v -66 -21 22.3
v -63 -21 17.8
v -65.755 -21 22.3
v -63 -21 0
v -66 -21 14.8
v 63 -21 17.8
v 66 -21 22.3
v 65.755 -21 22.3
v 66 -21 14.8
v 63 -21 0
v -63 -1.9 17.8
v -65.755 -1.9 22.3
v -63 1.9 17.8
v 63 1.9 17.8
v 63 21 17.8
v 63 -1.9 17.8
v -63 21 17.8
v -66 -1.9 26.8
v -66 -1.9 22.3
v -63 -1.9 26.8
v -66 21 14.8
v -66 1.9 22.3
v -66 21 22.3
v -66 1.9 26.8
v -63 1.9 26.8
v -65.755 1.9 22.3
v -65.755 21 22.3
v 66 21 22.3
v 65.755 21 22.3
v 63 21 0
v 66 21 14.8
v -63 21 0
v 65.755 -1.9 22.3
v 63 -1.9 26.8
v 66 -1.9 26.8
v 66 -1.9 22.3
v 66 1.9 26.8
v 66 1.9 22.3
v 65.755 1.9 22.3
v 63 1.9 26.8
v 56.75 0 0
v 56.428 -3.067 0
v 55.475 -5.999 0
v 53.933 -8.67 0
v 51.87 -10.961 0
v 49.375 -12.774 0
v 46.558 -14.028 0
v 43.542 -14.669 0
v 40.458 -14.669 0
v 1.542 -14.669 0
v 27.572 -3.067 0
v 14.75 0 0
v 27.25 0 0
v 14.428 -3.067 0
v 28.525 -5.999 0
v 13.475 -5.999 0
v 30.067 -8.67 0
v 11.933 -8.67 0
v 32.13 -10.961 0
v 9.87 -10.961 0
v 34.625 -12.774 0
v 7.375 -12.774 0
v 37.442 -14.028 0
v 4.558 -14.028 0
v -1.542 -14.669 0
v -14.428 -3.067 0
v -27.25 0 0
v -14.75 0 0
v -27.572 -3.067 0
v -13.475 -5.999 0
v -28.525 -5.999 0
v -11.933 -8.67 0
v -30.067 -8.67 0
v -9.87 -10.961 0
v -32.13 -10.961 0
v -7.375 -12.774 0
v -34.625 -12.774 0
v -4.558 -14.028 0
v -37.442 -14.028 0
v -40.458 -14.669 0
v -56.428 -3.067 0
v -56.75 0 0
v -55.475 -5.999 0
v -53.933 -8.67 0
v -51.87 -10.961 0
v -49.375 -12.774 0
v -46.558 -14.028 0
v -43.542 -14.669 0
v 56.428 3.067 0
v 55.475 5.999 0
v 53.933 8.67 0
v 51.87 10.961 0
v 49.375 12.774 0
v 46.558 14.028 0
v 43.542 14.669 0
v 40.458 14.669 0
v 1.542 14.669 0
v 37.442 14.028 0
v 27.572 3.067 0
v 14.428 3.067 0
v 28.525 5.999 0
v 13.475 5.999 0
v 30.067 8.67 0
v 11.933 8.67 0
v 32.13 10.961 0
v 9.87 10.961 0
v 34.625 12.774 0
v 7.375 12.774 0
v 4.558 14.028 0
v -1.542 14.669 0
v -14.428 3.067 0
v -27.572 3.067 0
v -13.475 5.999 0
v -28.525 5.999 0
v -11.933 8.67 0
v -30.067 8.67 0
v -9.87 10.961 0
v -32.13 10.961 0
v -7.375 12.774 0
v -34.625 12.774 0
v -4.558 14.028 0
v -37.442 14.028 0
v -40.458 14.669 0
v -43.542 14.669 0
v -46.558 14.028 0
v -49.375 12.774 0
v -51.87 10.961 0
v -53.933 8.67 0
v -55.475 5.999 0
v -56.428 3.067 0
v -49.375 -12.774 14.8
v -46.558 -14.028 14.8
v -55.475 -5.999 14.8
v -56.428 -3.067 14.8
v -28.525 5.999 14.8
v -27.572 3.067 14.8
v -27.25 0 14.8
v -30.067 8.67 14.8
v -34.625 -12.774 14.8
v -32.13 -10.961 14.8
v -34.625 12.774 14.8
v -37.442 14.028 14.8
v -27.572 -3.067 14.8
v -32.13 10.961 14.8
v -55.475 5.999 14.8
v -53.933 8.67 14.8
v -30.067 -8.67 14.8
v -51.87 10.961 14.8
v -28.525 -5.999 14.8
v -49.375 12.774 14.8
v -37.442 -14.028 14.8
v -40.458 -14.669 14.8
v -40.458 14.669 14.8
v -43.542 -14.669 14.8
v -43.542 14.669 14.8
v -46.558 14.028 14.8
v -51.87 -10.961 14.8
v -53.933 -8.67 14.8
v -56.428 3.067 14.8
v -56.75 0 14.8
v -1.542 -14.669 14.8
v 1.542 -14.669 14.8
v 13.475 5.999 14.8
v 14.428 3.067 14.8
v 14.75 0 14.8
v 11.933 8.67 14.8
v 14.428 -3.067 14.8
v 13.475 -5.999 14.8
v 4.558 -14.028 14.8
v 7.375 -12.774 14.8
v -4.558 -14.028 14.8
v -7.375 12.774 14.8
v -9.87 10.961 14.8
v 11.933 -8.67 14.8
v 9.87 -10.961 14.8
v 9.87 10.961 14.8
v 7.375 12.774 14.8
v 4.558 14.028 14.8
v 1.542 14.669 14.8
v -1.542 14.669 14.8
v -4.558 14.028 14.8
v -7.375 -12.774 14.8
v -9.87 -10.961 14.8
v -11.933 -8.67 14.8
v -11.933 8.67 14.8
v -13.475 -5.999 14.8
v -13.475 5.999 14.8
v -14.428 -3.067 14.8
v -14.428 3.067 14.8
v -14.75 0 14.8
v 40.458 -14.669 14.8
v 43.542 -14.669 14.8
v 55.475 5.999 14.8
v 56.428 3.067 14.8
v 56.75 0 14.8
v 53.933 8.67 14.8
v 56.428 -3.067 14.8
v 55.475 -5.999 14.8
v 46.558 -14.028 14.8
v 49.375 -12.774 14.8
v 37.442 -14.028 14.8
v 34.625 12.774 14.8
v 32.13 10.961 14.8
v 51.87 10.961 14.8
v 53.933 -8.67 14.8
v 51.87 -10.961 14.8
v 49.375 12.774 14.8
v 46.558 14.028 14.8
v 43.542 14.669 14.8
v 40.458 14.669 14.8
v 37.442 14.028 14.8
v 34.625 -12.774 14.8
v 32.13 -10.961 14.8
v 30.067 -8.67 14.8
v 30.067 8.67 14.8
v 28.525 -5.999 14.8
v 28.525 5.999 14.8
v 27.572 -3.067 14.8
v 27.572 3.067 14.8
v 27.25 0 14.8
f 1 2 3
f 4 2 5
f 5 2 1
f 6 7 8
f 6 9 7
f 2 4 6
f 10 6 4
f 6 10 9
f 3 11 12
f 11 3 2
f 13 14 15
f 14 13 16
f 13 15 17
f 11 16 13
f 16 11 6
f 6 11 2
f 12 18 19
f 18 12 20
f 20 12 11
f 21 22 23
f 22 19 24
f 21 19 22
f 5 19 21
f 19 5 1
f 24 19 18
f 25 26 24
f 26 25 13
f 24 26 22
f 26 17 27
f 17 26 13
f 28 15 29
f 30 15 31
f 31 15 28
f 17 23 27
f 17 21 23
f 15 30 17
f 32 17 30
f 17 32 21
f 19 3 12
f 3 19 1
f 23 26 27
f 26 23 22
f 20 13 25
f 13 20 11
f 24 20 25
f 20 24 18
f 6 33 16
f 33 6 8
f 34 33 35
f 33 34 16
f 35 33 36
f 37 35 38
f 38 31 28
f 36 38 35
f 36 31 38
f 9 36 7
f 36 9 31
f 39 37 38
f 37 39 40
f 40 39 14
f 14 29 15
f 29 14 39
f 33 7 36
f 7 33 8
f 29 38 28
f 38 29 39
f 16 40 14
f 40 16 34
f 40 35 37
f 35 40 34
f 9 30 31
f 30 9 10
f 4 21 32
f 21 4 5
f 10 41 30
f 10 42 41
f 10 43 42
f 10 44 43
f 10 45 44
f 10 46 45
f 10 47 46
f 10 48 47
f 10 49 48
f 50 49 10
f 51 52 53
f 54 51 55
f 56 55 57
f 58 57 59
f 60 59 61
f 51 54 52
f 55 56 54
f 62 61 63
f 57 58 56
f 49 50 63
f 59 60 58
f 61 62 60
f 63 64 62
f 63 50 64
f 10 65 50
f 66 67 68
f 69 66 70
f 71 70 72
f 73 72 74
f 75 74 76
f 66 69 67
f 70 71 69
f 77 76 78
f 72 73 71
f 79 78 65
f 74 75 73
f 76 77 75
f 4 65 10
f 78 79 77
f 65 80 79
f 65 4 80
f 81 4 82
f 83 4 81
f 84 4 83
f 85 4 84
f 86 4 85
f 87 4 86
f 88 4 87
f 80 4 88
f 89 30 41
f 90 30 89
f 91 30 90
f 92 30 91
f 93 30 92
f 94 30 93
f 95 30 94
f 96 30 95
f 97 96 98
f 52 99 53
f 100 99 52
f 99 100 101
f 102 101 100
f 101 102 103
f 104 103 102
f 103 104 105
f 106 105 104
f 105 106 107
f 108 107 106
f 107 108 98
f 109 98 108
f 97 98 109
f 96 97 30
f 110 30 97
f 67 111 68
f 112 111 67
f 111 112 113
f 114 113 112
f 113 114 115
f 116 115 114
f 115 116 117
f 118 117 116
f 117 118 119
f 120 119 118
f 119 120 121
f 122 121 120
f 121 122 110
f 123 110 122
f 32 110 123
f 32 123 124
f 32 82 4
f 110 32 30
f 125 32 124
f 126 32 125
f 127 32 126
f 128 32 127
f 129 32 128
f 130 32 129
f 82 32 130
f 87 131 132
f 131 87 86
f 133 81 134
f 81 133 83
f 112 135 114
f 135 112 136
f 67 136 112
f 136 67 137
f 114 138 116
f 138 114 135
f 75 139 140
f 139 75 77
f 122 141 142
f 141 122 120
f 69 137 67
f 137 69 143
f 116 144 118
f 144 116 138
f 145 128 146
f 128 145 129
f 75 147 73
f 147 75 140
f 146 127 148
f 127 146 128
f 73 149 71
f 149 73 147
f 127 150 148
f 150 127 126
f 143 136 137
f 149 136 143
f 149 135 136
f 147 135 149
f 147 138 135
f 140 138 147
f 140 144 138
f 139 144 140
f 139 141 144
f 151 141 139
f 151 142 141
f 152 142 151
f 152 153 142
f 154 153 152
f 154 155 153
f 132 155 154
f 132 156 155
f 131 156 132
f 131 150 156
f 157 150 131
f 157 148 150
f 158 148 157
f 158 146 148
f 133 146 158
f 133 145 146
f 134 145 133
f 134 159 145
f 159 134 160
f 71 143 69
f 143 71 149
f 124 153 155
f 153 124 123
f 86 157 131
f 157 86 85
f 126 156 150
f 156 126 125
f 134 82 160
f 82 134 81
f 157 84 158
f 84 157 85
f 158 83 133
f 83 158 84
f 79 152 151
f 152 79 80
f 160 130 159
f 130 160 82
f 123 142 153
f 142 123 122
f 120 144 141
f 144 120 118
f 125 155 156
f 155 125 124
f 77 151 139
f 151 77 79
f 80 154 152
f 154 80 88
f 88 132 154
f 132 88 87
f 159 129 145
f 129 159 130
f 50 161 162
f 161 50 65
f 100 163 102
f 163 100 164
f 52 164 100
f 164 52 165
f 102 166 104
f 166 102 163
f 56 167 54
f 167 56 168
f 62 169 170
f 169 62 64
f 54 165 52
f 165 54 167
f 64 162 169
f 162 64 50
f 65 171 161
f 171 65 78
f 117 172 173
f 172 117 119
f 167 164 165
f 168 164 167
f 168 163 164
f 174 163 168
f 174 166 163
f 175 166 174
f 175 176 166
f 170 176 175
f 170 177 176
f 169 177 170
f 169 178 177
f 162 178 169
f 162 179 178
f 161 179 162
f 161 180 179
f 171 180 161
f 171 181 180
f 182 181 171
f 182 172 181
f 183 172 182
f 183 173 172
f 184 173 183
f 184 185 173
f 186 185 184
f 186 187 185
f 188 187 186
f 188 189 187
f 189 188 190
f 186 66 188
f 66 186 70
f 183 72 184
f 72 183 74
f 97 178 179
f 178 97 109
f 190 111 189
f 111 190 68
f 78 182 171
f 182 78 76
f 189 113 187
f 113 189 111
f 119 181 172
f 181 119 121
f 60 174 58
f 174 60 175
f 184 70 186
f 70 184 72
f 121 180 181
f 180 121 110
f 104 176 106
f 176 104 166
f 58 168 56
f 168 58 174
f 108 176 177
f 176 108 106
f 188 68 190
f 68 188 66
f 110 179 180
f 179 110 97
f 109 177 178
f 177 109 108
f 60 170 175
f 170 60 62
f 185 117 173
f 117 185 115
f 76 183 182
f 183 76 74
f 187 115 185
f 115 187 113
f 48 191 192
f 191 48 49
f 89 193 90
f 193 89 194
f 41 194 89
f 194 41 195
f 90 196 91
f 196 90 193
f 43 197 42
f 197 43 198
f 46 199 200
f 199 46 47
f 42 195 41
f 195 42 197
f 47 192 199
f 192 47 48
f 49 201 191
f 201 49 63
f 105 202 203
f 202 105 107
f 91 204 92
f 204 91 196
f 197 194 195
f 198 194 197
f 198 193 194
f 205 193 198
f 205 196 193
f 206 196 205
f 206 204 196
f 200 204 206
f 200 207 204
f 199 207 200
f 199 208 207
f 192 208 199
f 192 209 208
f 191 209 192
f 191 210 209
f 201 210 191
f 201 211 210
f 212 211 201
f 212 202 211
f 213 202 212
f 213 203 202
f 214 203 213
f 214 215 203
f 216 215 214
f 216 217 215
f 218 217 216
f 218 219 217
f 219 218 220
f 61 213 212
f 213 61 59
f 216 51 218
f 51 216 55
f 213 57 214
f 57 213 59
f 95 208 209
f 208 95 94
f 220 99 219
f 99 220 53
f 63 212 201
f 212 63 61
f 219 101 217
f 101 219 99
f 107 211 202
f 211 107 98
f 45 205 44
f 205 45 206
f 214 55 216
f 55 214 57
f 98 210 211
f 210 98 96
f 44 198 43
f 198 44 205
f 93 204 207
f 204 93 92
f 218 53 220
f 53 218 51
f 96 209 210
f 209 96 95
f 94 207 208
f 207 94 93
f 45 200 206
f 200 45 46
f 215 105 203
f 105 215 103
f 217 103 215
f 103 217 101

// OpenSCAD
// file: constants.scad
// Copyright Ian G. Clifton 2026
// Apache 2.0 license
// https://github.com/IanGClifton/modular-paint-stack

GRIDFINITY_DIMENSION = 42;
CIRCLE_RESOLUTION = 100;

SHELF_SUPPORT_WIDTH = 3;
SHELF_SUPPORT_BLOCK_PROTRUSION = 9;
SHELF_SUPPORT_BLOCK_X = 3;
SHELF_SUPPORT_BLOCK_Y = 3.8;
SHELF_SUPPORT_ANGLE_X = 2.9;
SHELF_SUPPORT_ANGLE_Y = (GRIDFINITY_DIMENSION - SHELF_SUPPORT_BLOCK_Y) / 2;
SHELF_SUPPORT_ANGLE_PROTRUSION = 4.9;
SHELF_SUPPORT_SPACING = 2;
SHELF_SUPPORT_ANGLE_CUT = 0.4;

SHELF_THICKNESS = 3;
SHELF_MIN_BACK_RAIL = 8;

SIDE_X = 8;
SIDE_Y = GRIDFINITY_DIMENSION;

DOVETAIL_XMIN = 3.0;
DOVETAIL_XMAX = 4.0;
DOVETAIL_YDEPTH = 3.0;
DOVETAIL_ZDIFF = 5.0;
DOVETAIL_ZMAX = 30.0;
DOVETAIL_ZMIN = DOVETAIL_ZMAX - DOVETAIL_ZDIFF;
DOVETAIL_OFFSET = (SIDE_X / 2) - (DOVETAIL_XMAX / 2);

SHELF_BRACKET_WIDTH = 2;
SHELF_BRACKET_OPENING_HEIGHT = 5;
SHELF_BRACKET_OPENING_WIDTH = 3;
SHELF_BRACKET_CONNECTION_HEIGHT = 4;
SHELF_BRACKET_Y_DEPTH = 19;
SHELF_BRACKET_Y_GAP = 4;

CUTOUT_SHAPE_NONE = 0;
CUTOUT_SHAPE_OVAL = 1;
CUTOUT_SHAPE_RECTANGLE = 2;
CUTOUT_SHAPE_ANGLED_RECTANGLE = 3;

function getShelfMainWidth(gridfinityUnits) = GRIDFINITY_DIMENSION * gridfinityUnits;

function getShelfFullWidth(gridfinityUnits) = (SHELF_SUPPORT_WIDTH * 2) + getShelfMainWidth(gridfinityUnits);
// file: shelf_base.scad
// Copyright Ian G. Clifton 2026
// Apache 2.0 license
// https://github.com/IanGClifton/modular-paint-stack

include <constants.scad>

/**
  * Creates an empty shelf
  *
  * The shelf has the support pieces to fit into the walls,
  * but the top of the shelf is flat with no cutouts for
  * paints, brushes, etc.
  */
module uniformShelf(gridfinityWidth, gridfinityDepth = 1) {
    for (i = [0 : gridfinityDepth - 1]) {
        translate([0, GRIDFINITY_DIMENSION * i, 0]) {
            union() {
                // Shelf main
                cube([getShelfFullWidth(gridfinityWidth), GRIDFINITY_DIMENSION, SHELF_THICKNESS]);
                
                // Support on each end
                shelfSupport();
                translate([getShelfFullWidth(gridfinityWidth), 0, 0])
                    mirror([1, 0, 0])
                        shelfSupport();
            }
        }
    }
}

/**
  * Modifies the uniformShelf() to be thicker or thinner
  *
  * This adjusts only the center of the shelf where paints
  * would go, allowing the thickness of this part of the shelf
  * to match the paint neck height.
  */
module thicknessAdjustedShelf(gridfinityWidth, targetThickness, gridfinityDepth = 1) {
    if (targetThickness == SHELF_THICKNESS) {
        uniformShelf(gridfinityWidth, gridfinityDepth);
    } else if (targetThickness > SHELF_THICKNESS) {
        // Thicken the shelf
        union() {
            uniformShelf(gridfinityWidth, gridfinityDepth);
            translate([SHELF_SUPPORT_WIDTH + SHELF_SUPPORT_SPACING, 0, SHELF_THICKNESS])
                cube([getShelfMainWidth(gridfinityWidth) - (SHELF_SUPPORT_SPACING * 2), GRIDFINITY_DIMENSION * gridfinityDepth, targetThickness - SHELF_THICKNESS]);
        }
    } else {
        // Thin the shelf
        difference() {
            uniformShelf(gridfinityWidth, gridfinityDepth);
            translate([SHELF_SUPPORT_WIDTH + SHELF_SUPPORT_SPACING, 0, targetThickness])
                cube([getShelfMainWidth(gridfinityWidth) - (SHELF_SUPPORT_SPACING * 2), GRIDFINITY_DIMENSION * gridfinityDepth, SHELF_THICKNESS - targetThickness]);
        }
    }
}

/**
  * Creates the two triangles and center block used to connect
  * the shelf to the shelf brackets on the sides
  */
module shelfSupport() {
    topPoint = SHELF_THICKNESS + SHELF_SUPPORT_ANGLE_PROTRUSION;
    triangle_points = [
        // Front
        [0, 0, topPoint],                             // 0 TL
        [SHELF_SUPPORT_BLOCK_X, 0, SHELF_THICKNESS],  // 1 BR
        [0, 0, SHELF_THICKNESS],                      // 2 BL
        // Back
        [0, SHELF_SUPPORT_ANGLE_Y, topPoint],                            // 3 TL
        [SHELF_SUPPORT_BLOCK_X, SHELF_SUPPORT_ANGLE_Y, SHELF_THICKNESS], // 4 BR
        [0, SHELF_SUPPORT_ANGLE_Y, SHELF_THICKNESS]                      // 5 BL
    ];
    triangle_faces = [
        [0, 1, 2],    // Front face
        [3, 5, 4],    // Back face
        [3, 0, 2, 5], // Left side
        [3, 4, 1, 0], // Top
        [2, 1, 4, 5]  // Bottom  
    ];
    triangle_offset = SHELF_SUPPORT_ANGLE_Y + SHELF_SUPPORT_BLOCK_Y;
    union() {
        difference() {
            // Two triangles
            for (i = [0 : 1]) {
                translate([0, i * triangle_offset, 0])
                polyhedron(points = triangle_points, faces = triangle_faces);
            }
            // Cube to "cut" the tip of the triangles
            translate([0, 0, topPoint - SHELF_SUPPORT_ANGLE_CUT])
                cube([SHELF_SUPPORT_BLOCK_X, (SHELF_SUPPORT_ANGLE_Y * 2) + SHELF_SUPPORT_BLOCK_Y, SHELF_SUPPORT_ANGLE_CUT]);
        }
        // Add the block protrusion
        translate([0, SHELF_SUPPORT_ANGLE_Y, SHELF_THICKNESS])
            cube([SHELF_SUPPORT_BLOCK_X, SHELF_SUPPORT_BLOCK_Y, SHELF_SUPPORT_BLOCK_PROTRUSION]);
    }
}
// main file
// Copyright Ian G. Clifton 2026
// Apache 2.0 license
// https://github.com/IanGClifton/modular-paint-stack

// Gridfinity units (42mm each) to make the width of the inner shelf part  
shelf_gridfinity_unit_width = 3;
// How many mm to inset the cylinder cutout
cylinder_height = 14.8;
// Diameter of cylinder cutout
cylinder_diameter = 29.5;
// How many cutouts to include
cylinder_count = 3;
// Whether the top should be inset (slanted in) or flat (perfectly vertical)
top_inset = true;

include <shelf_base.scad>

/**
  * Creates a solid trapezoid that will be cut into for the paints
  */
module standingPaintSupport(gridfinityUnits, height, upperInset) {
    fullShelfWidth = getShelfFullWidth(gridfinityUnits);
    points = [
        // Base points
        [0, GRIDFINITY_DIMENSION, 0],              // 0 TL
        [fullShelfWidth, GRIDFINITY_DIMENSION, 0], // 1 TR
        [0, 0, 0],                                 // 2 BL
        [fullShelfWidth, 0, 0],                    // 3 BR
        // Extended points
        [upperInset, GRIDFINITY_DIMENSION, -height],                  // 4 TL
        [fullShelfWidth - upperInset, GRIDFINITY_DIMENSION, -height], // 5 TR
        [upperInset, 0, -height],                                     // 6 BL
        [fullShelfWidth - upperInset, 0, -height],                    // 7 BR
        
    ];
    faces = [
        [0, 1, 3, 2], // Top
        [0, 2, 6, 4], // Left
        [1, 0, 4, 5], // Back
        [3, 1, 5, 7], // Right
        [2, 3, 7, 6], // Front
        [4, 6, 7, 5]  // Bottom
    ];
    polyhedron(points, faces);
}

/**
  * Creates cylinders to represent each paint tube/bottle
  */
module cylinderCutOuts(shelfMainWidth, cylinderDiameter, cylinderHeight, cylinderCount) {
    holeSpacing = (shelfMainWidth - (cylinderDiameter * cylinderCount)) / cylinderCount;
    xOffset = SHELF_SUPPORT_WIDTH + (holeSpacing / 2) + (cylinderDiameter / 2);
    yOffset = (GRIDFINITY_DIMENSION / 2);
    zOffset = -cylinderHeight - 1;
    translate([xOffset, yOffset, zOffset]) {
        for (i = [0 : cylinderCount - 1]) {
            translate([(holeSpacing + cylinderDiameter) * i, 0, 0]) {
                cylinder(h = cylinderHeight + 1, r = cylinderDiameter/2);
            }
        }
    }
}

/**
  * Creates a shelf with support for standing paints and cylinders cut out
  */
module standingPaintShelf(gridfinityUnits, supportHeight, cylinderDiameter, cylinderCount, inset) {
    upperInset = inset ? SHELF_SUPPORT_WIDTH : 0;
    difference() {
        union() {
            uniformShelf(gridfinityUnits);
            standingPaintSupport(gridfinityUnits, supportHeight, upperInset);
        }
        cylinderCutOuts(getShelfMainWidth(gridfinityUnits), cylinderDiameter, supportHeight, cylinderCount);
    }
}

translate([-(getShelfFullWidth(shelf_gridfinity_unit_width) / 2), -(GRIDFINITY_DIMENSION / 2), cylinder_height]) {
    standingPaintShelf(shelf_gridfinity_unit_width, cylinder_height, cylinder_diameter, cylinder_count, top_inset);
}
